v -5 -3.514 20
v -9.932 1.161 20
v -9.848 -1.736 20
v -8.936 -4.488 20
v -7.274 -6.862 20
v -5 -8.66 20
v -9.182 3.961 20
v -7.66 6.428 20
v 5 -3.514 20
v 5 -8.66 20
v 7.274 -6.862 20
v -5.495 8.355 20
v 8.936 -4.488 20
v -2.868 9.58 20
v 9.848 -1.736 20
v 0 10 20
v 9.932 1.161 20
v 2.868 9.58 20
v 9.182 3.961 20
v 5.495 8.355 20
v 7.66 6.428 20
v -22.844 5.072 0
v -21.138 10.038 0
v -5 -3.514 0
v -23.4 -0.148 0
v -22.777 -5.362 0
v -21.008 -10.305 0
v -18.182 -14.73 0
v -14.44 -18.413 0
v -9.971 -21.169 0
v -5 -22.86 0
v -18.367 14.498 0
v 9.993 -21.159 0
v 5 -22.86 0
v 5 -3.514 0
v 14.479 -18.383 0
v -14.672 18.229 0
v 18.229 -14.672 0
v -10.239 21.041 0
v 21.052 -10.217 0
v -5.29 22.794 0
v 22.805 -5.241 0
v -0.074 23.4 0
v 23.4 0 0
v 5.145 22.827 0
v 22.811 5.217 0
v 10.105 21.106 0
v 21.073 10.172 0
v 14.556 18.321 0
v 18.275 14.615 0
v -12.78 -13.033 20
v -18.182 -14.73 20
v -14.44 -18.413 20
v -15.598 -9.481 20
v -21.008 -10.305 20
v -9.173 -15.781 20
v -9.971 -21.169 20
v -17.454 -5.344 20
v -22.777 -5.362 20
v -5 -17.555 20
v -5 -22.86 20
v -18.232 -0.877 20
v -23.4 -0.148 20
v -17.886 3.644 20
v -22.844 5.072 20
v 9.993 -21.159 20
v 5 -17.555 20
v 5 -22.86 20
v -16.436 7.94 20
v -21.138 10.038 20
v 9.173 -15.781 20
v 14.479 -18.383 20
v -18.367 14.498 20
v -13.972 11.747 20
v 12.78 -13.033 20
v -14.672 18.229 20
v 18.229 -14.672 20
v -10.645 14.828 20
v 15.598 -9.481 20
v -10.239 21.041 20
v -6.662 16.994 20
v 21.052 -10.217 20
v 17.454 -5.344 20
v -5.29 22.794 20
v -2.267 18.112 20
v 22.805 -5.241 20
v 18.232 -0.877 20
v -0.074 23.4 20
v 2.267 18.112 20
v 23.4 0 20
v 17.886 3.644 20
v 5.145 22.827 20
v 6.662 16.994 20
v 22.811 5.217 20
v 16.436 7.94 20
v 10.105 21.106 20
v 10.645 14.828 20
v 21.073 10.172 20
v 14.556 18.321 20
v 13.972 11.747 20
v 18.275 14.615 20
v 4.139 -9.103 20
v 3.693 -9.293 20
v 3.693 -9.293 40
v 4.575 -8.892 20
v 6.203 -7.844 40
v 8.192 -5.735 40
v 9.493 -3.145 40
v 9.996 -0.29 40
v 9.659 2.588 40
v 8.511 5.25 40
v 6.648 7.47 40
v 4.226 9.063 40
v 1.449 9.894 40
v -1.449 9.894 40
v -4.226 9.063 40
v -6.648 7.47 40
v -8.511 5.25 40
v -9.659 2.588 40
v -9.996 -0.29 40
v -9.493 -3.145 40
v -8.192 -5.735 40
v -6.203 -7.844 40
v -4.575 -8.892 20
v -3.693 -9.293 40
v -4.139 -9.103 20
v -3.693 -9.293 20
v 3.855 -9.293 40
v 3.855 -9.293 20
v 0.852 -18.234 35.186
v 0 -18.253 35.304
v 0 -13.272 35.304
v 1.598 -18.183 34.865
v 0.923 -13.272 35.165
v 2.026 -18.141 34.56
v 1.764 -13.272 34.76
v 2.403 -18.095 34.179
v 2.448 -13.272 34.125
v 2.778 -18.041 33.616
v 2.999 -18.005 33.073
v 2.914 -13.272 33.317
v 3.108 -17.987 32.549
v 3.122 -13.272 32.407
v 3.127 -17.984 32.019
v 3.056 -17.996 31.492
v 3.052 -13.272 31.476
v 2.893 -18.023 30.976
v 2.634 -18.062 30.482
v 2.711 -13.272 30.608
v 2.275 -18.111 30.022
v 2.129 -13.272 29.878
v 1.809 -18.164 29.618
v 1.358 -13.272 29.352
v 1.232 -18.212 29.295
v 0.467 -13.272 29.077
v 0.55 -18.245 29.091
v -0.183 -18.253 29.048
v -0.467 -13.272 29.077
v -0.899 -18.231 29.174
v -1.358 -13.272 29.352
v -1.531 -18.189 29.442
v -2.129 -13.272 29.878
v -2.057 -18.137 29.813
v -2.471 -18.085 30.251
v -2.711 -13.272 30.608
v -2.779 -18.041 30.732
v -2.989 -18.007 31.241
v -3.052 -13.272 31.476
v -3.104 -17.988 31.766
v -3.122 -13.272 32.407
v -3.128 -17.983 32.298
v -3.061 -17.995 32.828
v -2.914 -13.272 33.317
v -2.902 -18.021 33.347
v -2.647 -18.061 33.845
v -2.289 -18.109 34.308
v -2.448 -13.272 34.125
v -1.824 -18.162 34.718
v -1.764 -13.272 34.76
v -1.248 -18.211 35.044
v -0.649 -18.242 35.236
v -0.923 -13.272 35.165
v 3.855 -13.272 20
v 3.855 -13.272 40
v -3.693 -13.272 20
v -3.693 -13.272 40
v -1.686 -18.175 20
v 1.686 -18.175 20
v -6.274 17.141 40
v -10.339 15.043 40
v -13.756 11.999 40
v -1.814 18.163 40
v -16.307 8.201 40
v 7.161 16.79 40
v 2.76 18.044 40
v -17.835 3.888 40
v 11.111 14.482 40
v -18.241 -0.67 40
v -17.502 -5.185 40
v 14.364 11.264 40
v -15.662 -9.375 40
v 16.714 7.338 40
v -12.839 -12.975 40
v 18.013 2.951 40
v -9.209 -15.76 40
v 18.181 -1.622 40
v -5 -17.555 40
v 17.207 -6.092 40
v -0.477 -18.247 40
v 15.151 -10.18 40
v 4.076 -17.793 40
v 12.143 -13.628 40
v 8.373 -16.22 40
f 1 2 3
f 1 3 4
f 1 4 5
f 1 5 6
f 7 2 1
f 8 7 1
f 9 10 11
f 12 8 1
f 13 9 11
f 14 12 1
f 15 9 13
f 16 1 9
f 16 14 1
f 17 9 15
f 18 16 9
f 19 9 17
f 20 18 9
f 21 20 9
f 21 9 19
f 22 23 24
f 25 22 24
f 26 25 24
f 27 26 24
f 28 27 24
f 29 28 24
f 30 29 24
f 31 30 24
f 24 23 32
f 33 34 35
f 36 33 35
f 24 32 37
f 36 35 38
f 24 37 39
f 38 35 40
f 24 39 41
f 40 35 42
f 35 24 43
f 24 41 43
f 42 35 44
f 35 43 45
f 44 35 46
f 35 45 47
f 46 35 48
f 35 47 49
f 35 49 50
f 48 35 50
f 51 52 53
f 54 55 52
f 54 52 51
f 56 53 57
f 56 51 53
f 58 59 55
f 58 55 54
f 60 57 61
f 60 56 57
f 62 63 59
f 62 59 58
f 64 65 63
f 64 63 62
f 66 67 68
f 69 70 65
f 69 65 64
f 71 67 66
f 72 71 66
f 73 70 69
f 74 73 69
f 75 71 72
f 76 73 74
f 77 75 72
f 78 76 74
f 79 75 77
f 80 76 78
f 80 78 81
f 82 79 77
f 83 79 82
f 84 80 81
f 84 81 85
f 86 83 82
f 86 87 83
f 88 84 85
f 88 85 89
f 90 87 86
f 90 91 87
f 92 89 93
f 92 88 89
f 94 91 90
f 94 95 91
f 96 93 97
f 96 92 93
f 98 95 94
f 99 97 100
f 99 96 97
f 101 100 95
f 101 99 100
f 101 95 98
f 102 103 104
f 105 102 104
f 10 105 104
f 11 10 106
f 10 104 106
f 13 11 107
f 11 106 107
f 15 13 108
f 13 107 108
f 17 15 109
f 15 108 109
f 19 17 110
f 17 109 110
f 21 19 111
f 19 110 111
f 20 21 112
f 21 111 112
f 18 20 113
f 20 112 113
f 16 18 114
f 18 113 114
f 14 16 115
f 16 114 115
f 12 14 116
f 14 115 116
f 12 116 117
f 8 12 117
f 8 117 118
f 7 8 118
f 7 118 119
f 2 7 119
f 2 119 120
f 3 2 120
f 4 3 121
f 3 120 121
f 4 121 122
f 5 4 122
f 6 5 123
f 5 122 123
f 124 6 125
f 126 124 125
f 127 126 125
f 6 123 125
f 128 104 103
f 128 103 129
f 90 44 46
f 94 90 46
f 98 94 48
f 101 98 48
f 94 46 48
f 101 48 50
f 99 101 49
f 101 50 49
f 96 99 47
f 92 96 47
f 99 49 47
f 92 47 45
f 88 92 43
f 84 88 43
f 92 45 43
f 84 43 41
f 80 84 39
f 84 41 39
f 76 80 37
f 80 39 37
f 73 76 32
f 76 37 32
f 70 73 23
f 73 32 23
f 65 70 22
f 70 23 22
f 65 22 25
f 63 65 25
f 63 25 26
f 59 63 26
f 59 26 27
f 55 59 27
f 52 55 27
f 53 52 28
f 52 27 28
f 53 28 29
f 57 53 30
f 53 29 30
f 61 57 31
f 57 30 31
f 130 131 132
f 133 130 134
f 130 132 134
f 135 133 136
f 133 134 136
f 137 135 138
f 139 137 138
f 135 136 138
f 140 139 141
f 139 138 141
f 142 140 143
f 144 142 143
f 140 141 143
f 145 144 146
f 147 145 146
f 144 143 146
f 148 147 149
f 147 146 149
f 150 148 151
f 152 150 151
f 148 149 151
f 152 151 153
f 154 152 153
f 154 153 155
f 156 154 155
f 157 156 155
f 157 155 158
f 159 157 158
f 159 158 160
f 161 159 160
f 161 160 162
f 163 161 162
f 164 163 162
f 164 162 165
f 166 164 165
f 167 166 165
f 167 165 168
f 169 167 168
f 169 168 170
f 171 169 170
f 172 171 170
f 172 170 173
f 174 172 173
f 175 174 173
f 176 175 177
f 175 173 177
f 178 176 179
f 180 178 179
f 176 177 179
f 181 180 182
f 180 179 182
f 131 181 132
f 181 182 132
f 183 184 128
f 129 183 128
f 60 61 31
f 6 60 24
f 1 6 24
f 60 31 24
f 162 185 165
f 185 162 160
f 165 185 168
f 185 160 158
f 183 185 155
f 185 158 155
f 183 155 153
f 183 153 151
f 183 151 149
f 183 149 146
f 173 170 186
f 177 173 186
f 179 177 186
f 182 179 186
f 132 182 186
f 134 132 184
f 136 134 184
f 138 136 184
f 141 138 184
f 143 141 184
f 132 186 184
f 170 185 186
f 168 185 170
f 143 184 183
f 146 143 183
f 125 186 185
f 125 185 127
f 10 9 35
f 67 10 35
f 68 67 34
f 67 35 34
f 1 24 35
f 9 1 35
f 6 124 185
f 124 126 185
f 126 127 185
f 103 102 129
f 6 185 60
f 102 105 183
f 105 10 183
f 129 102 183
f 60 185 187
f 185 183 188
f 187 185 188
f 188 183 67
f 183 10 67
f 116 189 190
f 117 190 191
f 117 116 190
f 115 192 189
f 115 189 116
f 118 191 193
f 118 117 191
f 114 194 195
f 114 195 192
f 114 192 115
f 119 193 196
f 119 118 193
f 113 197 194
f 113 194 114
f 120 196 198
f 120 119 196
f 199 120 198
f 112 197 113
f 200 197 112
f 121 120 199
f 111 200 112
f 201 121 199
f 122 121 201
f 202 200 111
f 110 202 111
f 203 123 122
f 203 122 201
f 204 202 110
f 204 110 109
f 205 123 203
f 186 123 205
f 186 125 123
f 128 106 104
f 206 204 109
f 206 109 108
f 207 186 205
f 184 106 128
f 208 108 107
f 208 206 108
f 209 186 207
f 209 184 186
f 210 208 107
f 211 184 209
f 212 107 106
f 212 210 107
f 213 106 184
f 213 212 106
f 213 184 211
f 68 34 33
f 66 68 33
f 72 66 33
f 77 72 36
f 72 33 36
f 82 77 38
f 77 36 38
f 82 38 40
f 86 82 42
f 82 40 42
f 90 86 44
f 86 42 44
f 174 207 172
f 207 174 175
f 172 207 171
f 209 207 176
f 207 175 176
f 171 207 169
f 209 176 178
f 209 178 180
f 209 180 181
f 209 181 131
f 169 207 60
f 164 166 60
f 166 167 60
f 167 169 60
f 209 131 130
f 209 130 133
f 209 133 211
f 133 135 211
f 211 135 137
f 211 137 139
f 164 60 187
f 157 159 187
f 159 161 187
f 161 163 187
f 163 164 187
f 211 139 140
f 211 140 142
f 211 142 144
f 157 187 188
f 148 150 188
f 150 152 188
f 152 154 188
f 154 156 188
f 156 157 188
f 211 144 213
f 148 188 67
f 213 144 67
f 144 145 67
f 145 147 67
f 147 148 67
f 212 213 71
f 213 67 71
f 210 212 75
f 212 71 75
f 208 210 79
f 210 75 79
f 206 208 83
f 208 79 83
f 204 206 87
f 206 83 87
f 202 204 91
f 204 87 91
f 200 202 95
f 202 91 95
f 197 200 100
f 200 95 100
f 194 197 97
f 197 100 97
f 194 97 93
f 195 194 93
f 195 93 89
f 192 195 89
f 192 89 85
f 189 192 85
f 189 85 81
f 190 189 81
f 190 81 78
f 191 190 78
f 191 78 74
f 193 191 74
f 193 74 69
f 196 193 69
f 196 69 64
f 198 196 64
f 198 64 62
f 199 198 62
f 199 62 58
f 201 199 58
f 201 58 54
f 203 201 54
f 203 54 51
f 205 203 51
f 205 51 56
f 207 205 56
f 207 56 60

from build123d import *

# Parameters (mm, degrees)
SALIENTE_EXTRUIR1_DEPTH = 20
CROQUIS2_R              = 18.253461236
SALIENTE_EXTRUIR2_DEPTH = 20
CROQUIS3_R              = 10
CROQUIS3_W              = 7.547979368
CROQUIS3_H              = 3.978601063
CORTAR_EXTRUIR1_DEPTH   = 20
CROQUIS4_R              = 3.130594147
CORTAR_EXTRUIR2_DEPTH   = 20


with BuildPart() as part:
    # Croquis1 → Saliente-Extruir1 (new body)
    with BuildSketch(Plane.XY):
        with BuildLine():
            Line((-5, -22.8595713), (-5, -3.514210375))
            Line((-5, -3.514210375), (5, -3.514210375))
            Line((5, -3.514210375), (5, -22.8595713))
            ThreePointArc((5, -22.8595713), (18.228549037, -14.672423113), (23.4, 0))
            ThreePointArc((23.4, 0), (-14.672423113, 18.228549037), (-5, -22.8595713))
        make_face()
    extrude(amount=SALIENTE_EXTRUIR1_DEPTH)

    # Croquis2 → Saliente-Extruir2 (add)
    with BuildSketch(Plane.XY.offset(20)):
        with Locations(Location((0, 0, 0), (0, 0, 254.102297609))):
            Circle(CROQUIS2_R)
    extrude(amount=SALIENTE_EXTRUIR2_DEPTH)

    # Croquis3 → Cortar-Extruir1 (cut)
    with BuildSketch(Plane.XY.offset(40)):
        Circle(CROQUIS3_R)
        with Locations((0.081314891, -11.282532094)):
            Rectangle(CROQUIS3_W, CROQUIS3_H)
    extrude(amount=-CORTAR_EXTRUIR1_DEPTH, mode=Mode.SUBTRACT)

    # Croquis4 → Cortar-Extruir2 (cut)
    with BuildSketch(Plane(origin=(0, 0, 0), x_dir=(1, 0, 0), z_dir=(0, 1, 0))):
        with Locations(Location((0, -32.173004338, 0), (0, 0, 270))):
            Circle(CROQUIS4_R)
    extrude(amount=-CORTAR_EXTRUIR2_DEPTH, mode=Mode.SUBTRACT)


solid = part.part
